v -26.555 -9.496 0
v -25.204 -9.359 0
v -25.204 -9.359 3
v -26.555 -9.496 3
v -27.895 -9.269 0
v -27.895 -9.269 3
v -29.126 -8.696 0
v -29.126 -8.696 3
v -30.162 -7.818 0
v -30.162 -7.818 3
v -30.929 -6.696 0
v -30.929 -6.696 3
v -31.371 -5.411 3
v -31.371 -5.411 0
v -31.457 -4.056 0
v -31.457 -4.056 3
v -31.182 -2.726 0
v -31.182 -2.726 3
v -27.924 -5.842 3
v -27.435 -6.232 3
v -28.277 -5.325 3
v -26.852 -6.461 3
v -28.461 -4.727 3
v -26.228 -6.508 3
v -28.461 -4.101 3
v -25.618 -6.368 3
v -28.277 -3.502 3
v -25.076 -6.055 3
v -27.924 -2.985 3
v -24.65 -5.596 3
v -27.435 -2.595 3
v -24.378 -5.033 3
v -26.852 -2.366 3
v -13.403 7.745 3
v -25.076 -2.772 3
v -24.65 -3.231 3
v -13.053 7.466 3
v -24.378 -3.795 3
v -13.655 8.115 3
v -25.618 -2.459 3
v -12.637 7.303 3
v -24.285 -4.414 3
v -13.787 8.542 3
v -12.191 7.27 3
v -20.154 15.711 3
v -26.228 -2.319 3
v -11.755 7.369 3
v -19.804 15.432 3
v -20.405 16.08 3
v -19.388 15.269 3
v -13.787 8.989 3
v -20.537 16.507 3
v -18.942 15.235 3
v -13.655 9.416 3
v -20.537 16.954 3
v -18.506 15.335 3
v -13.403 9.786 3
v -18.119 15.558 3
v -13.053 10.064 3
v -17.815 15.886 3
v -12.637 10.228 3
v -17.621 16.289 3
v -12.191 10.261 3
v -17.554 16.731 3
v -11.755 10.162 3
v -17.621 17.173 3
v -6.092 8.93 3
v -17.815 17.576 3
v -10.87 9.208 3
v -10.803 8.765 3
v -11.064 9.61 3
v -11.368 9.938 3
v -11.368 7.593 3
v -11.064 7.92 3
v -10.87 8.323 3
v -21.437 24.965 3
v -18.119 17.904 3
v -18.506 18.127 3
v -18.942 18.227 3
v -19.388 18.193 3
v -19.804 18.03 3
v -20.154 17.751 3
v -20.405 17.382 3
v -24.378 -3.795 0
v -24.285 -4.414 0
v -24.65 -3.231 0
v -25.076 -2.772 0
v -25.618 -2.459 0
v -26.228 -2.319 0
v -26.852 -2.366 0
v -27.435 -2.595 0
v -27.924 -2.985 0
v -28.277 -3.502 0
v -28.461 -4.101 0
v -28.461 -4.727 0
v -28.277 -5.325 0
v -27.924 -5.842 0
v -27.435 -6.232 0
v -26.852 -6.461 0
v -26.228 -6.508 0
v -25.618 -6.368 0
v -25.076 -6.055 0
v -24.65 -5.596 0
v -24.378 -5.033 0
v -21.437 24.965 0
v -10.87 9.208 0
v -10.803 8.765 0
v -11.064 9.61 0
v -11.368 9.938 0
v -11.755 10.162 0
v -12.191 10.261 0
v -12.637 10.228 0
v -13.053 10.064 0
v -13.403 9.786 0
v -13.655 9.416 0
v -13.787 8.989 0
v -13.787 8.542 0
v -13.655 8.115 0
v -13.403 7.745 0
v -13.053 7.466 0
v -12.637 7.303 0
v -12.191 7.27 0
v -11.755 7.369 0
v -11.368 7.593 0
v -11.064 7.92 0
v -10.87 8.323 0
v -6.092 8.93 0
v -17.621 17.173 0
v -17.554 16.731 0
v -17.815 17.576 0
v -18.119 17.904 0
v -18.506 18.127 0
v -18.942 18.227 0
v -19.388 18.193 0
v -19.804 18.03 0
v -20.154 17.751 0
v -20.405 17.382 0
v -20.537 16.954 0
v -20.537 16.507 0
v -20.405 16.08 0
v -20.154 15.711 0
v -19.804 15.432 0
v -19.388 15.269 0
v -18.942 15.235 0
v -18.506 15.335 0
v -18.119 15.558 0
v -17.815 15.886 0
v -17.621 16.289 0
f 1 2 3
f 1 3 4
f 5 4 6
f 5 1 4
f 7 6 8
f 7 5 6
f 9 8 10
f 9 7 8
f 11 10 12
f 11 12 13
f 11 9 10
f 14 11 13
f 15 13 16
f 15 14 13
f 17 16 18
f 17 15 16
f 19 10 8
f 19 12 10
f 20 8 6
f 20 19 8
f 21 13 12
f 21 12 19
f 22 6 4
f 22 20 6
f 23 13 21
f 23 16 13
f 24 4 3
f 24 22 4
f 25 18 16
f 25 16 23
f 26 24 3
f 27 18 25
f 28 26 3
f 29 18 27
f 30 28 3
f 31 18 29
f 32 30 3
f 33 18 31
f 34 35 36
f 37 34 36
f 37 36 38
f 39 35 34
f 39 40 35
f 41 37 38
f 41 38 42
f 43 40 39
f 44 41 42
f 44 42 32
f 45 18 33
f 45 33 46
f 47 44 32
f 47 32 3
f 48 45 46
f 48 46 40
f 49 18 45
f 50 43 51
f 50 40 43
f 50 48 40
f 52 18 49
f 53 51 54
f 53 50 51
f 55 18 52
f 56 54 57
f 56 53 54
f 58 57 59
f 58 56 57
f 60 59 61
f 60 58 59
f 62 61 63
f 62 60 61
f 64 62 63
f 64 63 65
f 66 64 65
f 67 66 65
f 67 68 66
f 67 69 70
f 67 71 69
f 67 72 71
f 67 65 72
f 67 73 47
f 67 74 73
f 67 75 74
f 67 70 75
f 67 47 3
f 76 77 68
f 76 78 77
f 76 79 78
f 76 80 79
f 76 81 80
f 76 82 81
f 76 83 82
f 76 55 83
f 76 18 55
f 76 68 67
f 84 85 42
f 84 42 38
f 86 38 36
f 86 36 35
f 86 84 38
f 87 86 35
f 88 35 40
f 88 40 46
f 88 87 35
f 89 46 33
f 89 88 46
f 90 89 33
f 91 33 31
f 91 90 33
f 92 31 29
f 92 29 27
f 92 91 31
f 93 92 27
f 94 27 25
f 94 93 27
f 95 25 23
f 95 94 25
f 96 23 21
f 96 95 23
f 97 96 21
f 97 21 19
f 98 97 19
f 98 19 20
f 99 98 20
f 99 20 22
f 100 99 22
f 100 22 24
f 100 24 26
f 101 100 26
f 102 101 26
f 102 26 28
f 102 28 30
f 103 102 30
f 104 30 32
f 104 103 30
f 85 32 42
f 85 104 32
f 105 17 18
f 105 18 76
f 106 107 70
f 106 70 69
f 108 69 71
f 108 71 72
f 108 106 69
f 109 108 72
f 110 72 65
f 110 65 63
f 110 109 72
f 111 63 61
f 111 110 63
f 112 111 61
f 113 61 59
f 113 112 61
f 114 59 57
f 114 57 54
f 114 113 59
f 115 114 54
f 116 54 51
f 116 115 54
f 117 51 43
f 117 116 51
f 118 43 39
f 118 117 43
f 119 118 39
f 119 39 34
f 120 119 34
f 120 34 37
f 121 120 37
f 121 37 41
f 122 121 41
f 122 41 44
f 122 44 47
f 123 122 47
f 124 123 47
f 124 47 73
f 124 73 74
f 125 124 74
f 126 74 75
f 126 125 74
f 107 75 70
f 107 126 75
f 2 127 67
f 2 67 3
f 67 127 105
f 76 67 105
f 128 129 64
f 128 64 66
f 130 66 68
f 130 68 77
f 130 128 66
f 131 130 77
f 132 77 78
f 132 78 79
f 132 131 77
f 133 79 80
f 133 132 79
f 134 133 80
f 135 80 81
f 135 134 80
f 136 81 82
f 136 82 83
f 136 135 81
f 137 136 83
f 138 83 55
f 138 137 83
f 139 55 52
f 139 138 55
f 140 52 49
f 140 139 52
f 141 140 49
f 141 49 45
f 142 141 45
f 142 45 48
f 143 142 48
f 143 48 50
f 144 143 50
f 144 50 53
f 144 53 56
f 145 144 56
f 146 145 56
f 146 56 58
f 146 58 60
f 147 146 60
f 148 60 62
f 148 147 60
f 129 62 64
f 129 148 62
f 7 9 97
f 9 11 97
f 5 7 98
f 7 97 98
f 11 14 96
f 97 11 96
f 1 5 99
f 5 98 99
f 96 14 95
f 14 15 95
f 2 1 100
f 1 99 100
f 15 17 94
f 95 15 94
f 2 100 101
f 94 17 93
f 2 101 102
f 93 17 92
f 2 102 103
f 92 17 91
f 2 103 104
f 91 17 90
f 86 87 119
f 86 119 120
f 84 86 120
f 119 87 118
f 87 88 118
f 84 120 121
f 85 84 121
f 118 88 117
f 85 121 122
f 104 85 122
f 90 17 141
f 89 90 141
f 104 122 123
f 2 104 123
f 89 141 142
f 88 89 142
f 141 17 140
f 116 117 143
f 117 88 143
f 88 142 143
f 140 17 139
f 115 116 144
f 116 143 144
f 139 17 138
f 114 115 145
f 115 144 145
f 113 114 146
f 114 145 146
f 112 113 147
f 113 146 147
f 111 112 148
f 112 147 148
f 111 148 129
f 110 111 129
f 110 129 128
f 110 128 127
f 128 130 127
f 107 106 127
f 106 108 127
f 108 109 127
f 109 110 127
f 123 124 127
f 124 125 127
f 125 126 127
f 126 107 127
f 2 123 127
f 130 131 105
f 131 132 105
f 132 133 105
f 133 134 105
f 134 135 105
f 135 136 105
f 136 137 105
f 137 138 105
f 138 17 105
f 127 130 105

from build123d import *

# Parameters (mm, degrees)
SKETCH1_R           = 1.5
BOSS_EXTRUDE1_DEPTH = 3
SKETCH3_R           = 2.1
CUT_EXTRUDE1_DEPTH  = 5
BOSS_EXTRUDE2_START = -3
SKETCH4_R           = 2.1
SKETCH4_R_2         = 1.5
BOSS_EXTRUDE2_DEPTH = 3


with BuildPart() as part:
    # Sketch1 → Boss-Extrude1 (new body)
    with BuildSketch(Plane.XY):
        with BuildLine():
            Line((-23.846751299, 12.315625527), (-25.790964416, 1.588420048))
            ThreePointArc((-25.790964416, 1.588420048), (-23.621324023, -2.99099118), (-18.587504633, -2.408746401))
            Line((-18.587504633, -2.408746401), (-9.554934768, 5.787656918))
            Line((-9.554934768, 5.787656918), (-6.092344559, 8.929706888))
            Line((-6.092344559, 8.929706888), (-21.437418033, 24.964674832))
            Line((-21.437418033, 24.964674832), (-22.045496957, 21.772247946))
            Line((-22.045496957, 21.772247946), (-23.846751299, 12.315625527))
        make_face()
        with Locations((-19.053986742, 16.730936194)):
            Circle(SKETCH1_R, mode=Mode.SUBTRACT)
        with Locations((-12.303254046, 8.7654358)):
            Circle(SKETCH1_R, mode=Mode.SUBTRACT)
    extrude(amount=BOSS_EXTRUDE1_DEPTH)

    # Sketch3 → Cut-Extrude1 (cut)
    with BuildSketch(Plane.XY.offset(3)):
        with Locations((-21.51274635, 0.809673644)):
            Circle(SKETCH3_R)
    extrude(amount=-CUT_EXTRUDE1_DEPTH, mode=Mode.SUBTRACT)

    # Sketch4 → Boss-Extrude2 (add)
    with BuildSketch(Plane.XY.offset(3).offset(BOSS_EXTRUDE2_START)):
        with BuildLine():
            Line((-21.437418033, 24.964674832), (-6.092344559, 8.929706888))
            Line((-6.092344559, 8.929706888), (-25.203805177, -9.359495085))
            ThreePointArc((-25.203805177, -9.359495085), (-30.162494982, -7.817509351), (-31.18157458, -2.725574419))
            Line((-31.18157458, -2.725574419), (-21.437418033, 24.964674832))
        make_face()
        with Locations((-26.38487303, -4.41352639)):
            Circle(SKETCH4_R, mode=Mode.SUBTRACT)
        with Locations((-12.303254046, 8.7654358)):
            Circle(SKETCH4_R_2, mode=Mode.SUBTRACT)
        with Locations((-19.053986742, 16.730936194)):
            Circle(SKETCH4_R_2, mode=Mode.SUBTRACT)
    extrude(amount=BOSS_EXTRUDE2_DEPTH)


solid = part.part
